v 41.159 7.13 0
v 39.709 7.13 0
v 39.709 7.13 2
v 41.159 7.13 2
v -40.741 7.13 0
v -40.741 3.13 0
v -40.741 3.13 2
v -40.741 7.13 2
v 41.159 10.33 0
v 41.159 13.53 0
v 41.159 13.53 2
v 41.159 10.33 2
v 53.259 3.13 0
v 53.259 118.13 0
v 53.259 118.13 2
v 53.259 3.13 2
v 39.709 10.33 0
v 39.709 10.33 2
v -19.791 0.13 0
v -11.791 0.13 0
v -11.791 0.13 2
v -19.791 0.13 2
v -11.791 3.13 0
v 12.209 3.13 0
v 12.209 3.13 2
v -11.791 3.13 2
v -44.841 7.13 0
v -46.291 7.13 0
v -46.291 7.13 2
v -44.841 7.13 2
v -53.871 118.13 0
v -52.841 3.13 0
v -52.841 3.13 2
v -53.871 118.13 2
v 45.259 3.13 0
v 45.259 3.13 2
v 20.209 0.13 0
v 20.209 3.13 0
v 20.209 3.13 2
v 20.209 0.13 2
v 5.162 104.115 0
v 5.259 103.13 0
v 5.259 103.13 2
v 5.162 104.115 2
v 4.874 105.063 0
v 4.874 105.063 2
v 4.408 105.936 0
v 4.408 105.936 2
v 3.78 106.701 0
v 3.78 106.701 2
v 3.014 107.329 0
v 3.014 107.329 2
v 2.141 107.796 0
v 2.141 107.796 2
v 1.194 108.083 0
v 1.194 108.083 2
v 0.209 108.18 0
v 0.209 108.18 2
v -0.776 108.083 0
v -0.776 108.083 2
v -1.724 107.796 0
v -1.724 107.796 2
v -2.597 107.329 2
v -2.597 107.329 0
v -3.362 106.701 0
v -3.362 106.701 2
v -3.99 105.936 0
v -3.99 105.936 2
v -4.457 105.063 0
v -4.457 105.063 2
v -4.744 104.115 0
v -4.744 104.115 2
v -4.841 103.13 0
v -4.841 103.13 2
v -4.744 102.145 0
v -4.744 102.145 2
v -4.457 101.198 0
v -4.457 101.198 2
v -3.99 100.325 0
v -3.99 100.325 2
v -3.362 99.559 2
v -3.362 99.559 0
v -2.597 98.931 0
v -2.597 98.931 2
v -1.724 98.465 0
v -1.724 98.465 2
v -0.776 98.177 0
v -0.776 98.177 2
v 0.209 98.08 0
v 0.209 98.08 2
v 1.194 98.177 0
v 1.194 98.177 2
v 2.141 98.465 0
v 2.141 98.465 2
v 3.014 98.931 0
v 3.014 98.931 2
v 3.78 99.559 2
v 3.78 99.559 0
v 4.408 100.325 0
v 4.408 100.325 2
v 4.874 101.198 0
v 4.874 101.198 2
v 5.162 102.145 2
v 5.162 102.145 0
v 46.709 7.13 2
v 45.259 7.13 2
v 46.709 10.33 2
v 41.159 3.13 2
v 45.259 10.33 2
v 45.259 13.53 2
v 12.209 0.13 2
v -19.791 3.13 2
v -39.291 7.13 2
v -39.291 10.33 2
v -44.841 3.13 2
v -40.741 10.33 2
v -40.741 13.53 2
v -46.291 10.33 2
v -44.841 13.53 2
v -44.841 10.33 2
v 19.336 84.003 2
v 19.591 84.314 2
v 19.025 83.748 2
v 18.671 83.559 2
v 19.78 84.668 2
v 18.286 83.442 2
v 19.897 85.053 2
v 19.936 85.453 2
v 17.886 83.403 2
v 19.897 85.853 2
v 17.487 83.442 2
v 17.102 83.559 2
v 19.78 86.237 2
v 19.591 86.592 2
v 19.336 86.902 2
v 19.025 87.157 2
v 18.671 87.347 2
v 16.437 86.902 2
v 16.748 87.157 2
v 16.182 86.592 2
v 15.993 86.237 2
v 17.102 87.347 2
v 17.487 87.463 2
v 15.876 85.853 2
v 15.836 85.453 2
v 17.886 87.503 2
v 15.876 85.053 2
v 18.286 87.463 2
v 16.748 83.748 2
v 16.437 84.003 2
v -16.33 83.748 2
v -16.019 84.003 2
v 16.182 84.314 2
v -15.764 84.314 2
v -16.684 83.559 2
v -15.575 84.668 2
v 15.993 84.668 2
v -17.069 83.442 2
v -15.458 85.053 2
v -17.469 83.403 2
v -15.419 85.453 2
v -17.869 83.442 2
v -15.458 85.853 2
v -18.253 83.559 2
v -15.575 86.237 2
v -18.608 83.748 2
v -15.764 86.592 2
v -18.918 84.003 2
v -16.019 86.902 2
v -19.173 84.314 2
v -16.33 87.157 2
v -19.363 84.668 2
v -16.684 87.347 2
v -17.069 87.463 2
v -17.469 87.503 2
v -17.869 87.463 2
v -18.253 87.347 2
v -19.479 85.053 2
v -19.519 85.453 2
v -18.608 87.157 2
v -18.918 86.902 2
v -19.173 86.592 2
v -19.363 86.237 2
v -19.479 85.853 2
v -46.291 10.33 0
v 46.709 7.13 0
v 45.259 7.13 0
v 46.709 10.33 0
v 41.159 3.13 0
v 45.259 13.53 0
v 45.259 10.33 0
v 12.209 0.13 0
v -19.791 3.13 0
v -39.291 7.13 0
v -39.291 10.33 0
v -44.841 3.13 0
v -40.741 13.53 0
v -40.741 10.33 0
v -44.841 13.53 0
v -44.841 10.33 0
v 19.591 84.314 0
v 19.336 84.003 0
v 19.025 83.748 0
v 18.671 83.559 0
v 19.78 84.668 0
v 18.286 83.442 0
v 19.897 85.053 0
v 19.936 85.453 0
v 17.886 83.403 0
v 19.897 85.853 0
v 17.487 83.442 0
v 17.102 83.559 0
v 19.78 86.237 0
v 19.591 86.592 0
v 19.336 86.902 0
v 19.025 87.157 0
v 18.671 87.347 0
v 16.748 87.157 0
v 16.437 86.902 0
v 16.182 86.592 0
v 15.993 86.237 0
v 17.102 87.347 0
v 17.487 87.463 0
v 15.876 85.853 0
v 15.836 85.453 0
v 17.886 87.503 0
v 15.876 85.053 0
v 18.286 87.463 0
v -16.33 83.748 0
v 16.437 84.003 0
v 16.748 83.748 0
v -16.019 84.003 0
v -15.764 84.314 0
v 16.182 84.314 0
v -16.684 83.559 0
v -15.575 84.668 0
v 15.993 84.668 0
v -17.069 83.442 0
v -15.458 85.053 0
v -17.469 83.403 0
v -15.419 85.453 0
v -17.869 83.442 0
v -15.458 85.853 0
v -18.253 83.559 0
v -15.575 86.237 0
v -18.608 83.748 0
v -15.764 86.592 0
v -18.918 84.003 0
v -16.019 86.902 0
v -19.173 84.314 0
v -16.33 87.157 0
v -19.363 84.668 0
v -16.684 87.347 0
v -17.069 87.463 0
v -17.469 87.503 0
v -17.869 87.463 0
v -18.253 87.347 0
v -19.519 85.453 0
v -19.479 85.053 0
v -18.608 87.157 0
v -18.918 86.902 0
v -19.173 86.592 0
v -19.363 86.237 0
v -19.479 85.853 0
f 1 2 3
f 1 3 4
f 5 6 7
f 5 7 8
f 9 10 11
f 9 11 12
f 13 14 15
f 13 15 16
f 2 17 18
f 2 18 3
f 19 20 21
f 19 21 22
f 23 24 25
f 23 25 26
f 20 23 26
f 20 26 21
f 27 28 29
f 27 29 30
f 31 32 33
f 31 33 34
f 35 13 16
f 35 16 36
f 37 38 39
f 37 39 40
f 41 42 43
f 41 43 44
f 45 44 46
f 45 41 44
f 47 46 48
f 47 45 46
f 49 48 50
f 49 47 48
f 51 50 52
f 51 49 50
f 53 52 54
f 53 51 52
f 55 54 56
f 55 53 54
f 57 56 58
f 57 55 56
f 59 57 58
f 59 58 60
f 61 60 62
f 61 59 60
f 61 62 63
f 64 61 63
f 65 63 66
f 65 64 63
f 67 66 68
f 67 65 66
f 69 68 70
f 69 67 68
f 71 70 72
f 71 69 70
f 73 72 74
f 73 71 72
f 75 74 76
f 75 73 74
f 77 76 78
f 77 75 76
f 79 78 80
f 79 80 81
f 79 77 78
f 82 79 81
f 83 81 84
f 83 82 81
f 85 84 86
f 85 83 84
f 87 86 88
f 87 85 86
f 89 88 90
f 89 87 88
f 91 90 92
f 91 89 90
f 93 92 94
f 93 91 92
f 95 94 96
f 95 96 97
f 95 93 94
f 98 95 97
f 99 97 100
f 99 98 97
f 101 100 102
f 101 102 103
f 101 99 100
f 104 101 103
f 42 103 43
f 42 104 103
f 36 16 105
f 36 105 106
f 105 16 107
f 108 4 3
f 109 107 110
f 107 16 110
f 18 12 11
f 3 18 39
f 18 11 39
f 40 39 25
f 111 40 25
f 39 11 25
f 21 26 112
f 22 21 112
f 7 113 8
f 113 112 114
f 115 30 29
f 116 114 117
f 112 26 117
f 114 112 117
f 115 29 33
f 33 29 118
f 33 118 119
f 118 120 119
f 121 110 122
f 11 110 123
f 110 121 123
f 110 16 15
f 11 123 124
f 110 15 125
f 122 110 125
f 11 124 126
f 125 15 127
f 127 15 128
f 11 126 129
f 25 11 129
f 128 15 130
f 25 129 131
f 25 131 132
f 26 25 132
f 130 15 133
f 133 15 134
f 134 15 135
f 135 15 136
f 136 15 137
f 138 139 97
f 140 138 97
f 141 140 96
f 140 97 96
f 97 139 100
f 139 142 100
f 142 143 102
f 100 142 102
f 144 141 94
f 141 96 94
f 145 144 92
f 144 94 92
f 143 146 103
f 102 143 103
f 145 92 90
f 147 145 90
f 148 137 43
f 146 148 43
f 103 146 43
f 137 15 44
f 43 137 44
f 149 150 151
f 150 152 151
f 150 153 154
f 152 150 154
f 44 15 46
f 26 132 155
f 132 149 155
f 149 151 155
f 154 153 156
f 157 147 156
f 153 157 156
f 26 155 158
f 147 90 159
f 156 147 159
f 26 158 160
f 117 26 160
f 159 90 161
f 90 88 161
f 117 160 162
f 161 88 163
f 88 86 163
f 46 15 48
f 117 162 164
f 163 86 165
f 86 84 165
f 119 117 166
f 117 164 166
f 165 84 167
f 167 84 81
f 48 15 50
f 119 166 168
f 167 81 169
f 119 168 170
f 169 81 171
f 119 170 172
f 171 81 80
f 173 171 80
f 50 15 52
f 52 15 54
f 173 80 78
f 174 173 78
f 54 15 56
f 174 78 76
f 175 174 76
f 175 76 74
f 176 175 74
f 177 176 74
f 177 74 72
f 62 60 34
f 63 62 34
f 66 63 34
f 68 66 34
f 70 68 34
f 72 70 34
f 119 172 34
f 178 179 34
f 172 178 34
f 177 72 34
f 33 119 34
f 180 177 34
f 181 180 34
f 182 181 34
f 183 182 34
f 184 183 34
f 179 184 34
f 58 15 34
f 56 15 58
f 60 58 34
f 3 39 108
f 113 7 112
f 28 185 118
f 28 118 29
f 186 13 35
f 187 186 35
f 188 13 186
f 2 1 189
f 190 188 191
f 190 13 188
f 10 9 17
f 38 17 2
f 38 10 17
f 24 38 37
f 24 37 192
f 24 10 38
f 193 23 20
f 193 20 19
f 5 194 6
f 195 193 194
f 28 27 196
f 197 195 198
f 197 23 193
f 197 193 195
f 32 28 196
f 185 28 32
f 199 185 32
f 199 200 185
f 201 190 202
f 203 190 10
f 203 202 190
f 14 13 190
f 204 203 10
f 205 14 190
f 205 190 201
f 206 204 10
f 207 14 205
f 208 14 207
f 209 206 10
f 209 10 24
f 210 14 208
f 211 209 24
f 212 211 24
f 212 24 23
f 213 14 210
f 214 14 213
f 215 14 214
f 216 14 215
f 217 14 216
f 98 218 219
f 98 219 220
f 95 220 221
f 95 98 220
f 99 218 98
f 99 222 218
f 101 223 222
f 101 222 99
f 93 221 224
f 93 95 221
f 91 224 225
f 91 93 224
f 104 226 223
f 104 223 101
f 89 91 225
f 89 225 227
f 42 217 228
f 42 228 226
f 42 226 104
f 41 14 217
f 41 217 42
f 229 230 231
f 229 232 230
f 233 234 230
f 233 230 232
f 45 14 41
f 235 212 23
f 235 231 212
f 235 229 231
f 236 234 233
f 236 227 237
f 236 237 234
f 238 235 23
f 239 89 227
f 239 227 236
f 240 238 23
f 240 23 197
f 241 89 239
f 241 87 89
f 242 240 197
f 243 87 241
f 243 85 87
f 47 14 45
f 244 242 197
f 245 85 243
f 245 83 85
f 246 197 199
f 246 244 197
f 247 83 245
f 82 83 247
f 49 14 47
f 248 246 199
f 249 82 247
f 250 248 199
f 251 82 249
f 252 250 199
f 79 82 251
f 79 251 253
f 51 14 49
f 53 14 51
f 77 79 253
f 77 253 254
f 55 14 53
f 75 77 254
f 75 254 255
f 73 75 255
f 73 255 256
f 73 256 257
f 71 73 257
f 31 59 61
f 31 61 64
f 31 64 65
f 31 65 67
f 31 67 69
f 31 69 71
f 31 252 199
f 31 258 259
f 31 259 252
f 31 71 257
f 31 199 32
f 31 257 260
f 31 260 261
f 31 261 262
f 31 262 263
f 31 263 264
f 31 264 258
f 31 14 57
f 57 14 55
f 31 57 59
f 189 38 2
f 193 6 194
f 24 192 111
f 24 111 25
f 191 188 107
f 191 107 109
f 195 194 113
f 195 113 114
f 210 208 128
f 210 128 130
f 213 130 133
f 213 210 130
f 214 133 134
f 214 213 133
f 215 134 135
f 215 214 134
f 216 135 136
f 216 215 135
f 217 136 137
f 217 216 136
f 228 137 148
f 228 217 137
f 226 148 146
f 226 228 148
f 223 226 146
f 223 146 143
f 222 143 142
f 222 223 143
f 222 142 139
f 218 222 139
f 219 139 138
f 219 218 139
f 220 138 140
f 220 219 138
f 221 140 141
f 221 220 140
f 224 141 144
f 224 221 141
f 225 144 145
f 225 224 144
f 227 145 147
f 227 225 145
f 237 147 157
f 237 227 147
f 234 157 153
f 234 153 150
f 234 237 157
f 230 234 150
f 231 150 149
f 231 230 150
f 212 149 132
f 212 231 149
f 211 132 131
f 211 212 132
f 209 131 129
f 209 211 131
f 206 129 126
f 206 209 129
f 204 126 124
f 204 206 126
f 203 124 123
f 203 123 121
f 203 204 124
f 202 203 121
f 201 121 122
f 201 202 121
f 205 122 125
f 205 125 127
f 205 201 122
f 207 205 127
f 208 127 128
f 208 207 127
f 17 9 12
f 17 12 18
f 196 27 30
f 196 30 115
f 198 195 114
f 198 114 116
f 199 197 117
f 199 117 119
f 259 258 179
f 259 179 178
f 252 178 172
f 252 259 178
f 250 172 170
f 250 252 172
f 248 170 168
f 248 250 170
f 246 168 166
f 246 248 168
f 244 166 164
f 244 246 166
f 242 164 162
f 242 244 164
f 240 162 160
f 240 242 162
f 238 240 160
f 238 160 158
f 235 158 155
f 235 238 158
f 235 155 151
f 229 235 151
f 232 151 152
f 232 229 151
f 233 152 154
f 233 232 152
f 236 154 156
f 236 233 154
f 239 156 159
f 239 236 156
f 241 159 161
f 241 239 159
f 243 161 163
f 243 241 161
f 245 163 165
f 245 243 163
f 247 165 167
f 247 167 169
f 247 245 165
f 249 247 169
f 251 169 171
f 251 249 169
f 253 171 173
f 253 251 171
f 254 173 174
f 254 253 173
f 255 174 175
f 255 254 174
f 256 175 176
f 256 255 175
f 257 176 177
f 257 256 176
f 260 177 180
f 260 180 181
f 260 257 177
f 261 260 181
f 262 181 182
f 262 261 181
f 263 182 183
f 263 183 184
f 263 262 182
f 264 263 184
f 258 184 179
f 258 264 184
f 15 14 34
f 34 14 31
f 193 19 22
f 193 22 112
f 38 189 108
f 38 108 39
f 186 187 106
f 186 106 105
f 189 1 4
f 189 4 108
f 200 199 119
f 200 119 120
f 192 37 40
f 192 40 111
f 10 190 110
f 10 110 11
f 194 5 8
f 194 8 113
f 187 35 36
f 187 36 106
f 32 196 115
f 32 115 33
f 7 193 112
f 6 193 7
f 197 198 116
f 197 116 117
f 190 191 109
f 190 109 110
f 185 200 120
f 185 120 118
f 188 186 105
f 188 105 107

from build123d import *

# Parameters (mm, degrees)
SKETCH_1_R      = 5.05
SKETCH_1_R_2    = 2.05
EXTRUDE_1_DEPTH = 2


with BuildPart() as part:
    # 草图1 → 凸台-拉伸1 (new body)
    with BuildSketch(Plane.XY):
        Polygon((-40.741188564, 3.13029316), (-40.741188564, 7.13029316), (-39.291188564, 7.13029316), (-39.291188564, 10.33029316), (-40.741188564, 10.33029316), (-40.741188564, 13.53029316), (-44.841188564, 13.53029316), (-44.841188564, 10.33029316), (-46.291188564, 10.33029316), (-46.291188564, 7.13029316), (-44.841188564, 7.13029316), (-44.841188564, 3.13029316), (-52.841188564, 3.13029316), (-53.870849739, 118.13029316), (43.582829756, 118.13029316), (53.258811436, 118.13029316), (53.258811436, 3.13029316), (45.258811436, 3.13029316), (45.258811436, 7.13029316), (46.708811436, 7.13029316), (46.708811436, 10.33029316), (45.258811436, 10.33029316), (45.258811436, 13.53029316), (41.158811436, 13.53029316), (41.158811436, 10.33029316), (39.708811436, 10.33029316), (39.708811436, 7.13029316), (41.158811436, 7.13029316), (41.158811436, 3.13029316), (20.208811436, 3.13029316), (20.208811436, 0.13029316), (12.208811436, 0.13029316), (12.208811436, 3.13029316), (-11.791188564, 3.13029316), (-11.791188564, 0.13029316), (-19.791188564, 0.13029316), (-19.791188564, 3.13029316), align=None)
        with Locations((0.208811436, 103.13029316)):
            Circle(SKETCH_1_R, mode=Mode.SUBTRACT)
        with Locations((17.886480965, 85.45262363)):
            Circle(SKETCH_1_R_2, mode=Mode.SUBTRACT)
        with Locations(Location((-17.468858094, 85.45262363, 0), (0, 0, 180))):
            Circle(SKETCH_1_R_2, mode=Mode.SUBTRACT)
    extrude(amount=EXTRUDE_1_DEPTH)


solid = part.part
